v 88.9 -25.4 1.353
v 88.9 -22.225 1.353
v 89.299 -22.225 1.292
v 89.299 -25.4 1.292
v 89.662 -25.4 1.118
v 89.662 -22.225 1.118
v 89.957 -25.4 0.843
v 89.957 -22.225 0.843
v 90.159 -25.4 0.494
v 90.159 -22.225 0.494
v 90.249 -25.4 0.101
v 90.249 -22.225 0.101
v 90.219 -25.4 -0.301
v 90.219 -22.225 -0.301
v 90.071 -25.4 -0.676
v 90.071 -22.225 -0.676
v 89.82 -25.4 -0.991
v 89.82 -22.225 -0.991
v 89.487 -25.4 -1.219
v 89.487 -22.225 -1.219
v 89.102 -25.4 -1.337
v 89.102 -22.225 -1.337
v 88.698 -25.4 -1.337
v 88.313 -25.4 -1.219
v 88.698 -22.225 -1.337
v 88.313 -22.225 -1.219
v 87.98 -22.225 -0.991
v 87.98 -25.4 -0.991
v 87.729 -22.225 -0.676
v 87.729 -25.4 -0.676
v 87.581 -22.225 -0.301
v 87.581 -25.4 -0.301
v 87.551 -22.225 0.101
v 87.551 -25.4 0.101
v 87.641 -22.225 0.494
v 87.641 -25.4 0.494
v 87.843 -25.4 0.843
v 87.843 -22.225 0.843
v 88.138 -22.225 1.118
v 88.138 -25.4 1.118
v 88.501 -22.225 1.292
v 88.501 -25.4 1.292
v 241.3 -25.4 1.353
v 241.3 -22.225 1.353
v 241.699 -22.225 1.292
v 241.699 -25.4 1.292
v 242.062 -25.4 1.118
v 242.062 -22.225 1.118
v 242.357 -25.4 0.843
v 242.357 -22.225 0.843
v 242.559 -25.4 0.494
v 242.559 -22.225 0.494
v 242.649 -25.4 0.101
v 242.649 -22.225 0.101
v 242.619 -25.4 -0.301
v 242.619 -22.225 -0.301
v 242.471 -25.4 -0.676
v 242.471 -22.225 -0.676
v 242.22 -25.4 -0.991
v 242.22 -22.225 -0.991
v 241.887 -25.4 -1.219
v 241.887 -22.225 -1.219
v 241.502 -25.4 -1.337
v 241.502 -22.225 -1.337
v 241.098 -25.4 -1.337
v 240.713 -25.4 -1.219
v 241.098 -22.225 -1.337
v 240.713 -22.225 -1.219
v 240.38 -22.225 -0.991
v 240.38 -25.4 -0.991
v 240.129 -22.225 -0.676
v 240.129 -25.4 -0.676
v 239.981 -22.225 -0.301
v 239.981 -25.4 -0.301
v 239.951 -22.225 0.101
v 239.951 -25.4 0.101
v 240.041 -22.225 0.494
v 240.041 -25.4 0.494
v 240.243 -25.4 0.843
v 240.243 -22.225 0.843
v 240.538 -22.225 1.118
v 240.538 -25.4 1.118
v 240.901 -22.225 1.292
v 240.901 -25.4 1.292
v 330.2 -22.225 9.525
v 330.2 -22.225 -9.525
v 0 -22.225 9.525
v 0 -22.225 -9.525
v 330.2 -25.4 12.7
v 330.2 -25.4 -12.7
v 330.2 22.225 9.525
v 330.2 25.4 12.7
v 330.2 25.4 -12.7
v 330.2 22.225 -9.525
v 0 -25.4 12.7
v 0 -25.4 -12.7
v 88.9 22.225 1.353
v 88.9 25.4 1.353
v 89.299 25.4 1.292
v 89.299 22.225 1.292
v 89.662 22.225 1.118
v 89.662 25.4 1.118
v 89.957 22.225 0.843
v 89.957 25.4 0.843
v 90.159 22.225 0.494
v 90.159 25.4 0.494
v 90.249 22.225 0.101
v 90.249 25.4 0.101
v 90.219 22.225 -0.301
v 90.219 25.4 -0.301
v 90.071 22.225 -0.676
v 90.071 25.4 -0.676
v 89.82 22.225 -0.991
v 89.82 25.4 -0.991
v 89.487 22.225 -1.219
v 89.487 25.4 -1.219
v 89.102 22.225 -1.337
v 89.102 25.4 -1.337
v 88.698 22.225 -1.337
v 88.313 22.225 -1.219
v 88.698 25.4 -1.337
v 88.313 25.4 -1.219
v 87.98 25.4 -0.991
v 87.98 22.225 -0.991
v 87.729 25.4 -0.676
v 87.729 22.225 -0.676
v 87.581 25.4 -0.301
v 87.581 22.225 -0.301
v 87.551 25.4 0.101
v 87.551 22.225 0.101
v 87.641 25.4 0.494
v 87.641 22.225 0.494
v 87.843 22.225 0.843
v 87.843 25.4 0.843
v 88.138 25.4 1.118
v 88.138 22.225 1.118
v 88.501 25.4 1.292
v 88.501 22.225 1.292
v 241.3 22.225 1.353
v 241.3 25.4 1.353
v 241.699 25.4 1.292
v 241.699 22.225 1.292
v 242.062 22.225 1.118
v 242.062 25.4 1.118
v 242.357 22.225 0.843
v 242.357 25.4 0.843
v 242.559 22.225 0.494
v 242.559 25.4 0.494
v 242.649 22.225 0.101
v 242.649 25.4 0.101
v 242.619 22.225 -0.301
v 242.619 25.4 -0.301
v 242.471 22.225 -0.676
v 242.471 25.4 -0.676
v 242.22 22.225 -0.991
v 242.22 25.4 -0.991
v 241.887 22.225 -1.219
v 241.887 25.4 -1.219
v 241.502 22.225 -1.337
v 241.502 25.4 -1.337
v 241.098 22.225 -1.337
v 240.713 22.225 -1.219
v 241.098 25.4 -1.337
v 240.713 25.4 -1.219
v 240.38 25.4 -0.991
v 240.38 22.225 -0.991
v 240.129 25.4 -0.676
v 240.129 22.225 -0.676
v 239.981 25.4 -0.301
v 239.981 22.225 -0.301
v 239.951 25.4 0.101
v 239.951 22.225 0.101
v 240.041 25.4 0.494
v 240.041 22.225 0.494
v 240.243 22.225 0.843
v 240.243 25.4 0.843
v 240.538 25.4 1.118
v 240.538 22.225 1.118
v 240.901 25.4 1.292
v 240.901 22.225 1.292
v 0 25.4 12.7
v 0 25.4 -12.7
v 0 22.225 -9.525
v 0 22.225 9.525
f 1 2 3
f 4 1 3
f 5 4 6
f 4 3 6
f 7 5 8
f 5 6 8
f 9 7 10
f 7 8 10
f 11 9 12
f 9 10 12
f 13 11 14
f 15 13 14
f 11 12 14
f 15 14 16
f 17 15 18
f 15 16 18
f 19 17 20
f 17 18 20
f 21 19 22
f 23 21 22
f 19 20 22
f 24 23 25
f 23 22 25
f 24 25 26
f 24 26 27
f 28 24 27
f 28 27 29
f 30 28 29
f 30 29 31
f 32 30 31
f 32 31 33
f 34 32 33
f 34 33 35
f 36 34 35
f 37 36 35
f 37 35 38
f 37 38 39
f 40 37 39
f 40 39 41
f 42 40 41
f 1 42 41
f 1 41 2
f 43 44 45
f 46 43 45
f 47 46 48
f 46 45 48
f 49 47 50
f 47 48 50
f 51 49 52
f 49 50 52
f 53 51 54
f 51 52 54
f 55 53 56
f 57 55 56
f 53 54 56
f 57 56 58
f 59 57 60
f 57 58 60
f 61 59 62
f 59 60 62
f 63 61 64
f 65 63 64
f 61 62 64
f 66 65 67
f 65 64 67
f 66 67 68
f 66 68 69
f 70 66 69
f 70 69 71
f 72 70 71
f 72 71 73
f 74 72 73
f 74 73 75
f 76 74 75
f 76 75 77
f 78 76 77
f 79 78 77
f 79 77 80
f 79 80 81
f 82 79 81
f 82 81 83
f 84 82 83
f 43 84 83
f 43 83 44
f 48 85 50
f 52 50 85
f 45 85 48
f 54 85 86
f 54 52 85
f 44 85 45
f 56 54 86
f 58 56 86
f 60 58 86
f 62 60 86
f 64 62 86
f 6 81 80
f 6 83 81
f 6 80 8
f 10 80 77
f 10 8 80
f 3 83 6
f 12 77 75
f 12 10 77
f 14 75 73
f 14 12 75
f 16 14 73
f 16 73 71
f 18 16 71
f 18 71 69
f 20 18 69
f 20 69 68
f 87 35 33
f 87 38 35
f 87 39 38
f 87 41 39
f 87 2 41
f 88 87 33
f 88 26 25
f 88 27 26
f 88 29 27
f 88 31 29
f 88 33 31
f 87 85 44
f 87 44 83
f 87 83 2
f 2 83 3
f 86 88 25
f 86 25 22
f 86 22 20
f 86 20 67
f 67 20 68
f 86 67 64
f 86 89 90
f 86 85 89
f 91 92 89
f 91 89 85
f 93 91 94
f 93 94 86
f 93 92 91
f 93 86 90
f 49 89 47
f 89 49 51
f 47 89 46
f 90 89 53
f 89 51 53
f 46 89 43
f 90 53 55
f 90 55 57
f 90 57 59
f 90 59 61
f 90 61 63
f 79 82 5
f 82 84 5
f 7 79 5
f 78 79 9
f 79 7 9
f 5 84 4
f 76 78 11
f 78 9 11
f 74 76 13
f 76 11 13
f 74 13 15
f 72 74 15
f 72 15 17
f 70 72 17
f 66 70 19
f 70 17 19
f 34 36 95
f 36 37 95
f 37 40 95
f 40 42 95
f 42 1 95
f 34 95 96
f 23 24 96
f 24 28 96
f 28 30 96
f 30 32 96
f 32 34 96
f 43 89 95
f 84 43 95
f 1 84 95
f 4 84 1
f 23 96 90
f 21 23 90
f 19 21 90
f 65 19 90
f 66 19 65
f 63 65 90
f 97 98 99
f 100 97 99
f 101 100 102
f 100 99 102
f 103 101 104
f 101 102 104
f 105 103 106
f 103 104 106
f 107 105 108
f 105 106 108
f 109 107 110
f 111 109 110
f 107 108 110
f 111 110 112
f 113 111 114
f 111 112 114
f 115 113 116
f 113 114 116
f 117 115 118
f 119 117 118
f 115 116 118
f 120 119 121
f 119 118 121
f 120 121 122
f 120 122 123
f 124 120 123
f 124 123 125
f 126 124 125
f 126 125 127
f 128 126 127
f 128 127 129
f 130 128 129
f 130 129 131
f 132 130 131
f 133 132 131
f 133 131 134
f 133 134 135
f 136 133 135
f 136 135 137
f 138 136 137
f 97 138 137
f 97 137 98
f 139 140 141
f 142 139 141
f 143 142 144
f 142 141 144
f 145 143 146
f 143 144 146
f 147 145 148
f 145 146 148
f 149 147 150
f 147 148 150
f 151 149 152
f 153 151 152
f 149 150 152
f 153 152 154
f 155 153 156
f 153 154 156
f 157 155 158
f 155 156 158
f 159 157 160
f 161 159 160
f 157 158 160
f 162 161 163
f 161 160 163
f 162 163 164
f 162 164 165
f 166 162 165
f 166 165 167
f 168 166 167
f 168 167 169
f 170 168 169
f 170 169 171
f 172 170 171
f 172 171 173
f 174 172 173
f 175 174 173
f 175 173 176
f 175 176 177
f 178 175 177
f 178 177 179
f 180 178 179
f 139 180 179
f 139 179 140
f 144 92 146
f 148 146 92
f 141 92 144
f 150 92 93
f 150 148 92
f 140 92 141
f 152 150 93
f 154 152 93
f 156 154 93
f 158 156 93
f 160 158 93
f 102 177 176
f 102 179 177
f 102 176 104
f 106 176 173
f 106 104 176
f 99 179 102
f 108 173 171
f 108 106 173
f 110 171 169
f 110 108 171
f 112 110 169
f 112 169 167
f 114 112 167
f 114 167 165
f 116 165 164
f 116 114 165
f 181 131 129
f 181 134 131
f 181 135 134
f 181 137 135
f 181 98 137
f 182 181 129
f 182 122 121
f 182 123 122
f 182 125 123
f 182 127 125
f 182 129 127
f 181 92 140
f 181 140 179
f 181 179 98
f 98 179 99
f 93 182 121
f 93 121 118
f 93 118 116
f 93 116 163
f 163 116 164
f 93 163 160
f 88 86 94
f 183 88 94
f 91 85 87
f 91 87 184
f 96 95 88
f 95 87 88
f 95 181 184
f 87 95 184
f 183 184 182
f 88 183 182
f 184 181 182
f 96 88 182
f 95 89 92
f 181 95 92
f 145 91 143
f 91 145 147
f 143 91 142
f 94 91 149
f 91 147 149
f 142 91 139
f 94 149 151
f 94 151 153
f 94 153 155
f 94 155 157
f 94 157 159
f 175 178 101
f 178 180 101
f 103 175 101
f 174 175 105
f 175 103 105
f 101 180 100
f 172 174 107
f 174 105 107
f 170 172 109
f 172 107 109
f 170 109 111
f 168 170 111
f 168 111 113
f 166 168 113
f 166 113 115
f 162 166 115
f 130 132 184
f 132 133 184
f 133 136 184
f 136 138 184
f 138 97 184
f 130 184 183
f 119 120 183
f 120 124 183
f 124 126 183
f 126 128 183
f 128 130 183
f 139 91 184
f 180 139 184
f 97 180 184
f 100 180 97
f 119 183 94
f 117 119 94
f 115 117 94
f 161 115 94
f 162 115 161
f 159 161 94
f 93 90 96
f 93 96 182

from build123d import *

# Parameters (mm, degrees)
SKETCH1_W             = 25.4
SKETCH1_H             = 50.8
SKETCH1_W_2           = 19.05
SKETCH1_H_2           = 44.45
BOSS_EXTRUDE1_DEPTH   = 330.2
F_6_32_TAPPED_HOLE6_D = 2.7051


with BuildPart() as part:
    # Sketch1 → Boss-Extrude1 (new body)
    with BuildSketch(Plane(origin=(0, 0, 0), x_dir=(0, 0, -1), z_dir=(1, 0, 0))):
        Rectangle(SKETCH1_W, SKETCH1_H)
        Rectangle(SKETCH1_W_2, SKETCH1_H_2, mode=Mode.SUBTRACT)
    extrude(amount=BOSS_EXTRUDE1_DEPTH)

    # #6-32 Tapped Hole6 (through all)
    with Locations(Plane(origin=(88.9, -25.4, 0), x_dir=(0, 0, -1), z_dir=(0, -1, 0))):
        with Locations((0, 0), (0, 152.4)):
            Hole(F_6_32_TAPPED_HOLE6_D / 2)


solid = part.part
